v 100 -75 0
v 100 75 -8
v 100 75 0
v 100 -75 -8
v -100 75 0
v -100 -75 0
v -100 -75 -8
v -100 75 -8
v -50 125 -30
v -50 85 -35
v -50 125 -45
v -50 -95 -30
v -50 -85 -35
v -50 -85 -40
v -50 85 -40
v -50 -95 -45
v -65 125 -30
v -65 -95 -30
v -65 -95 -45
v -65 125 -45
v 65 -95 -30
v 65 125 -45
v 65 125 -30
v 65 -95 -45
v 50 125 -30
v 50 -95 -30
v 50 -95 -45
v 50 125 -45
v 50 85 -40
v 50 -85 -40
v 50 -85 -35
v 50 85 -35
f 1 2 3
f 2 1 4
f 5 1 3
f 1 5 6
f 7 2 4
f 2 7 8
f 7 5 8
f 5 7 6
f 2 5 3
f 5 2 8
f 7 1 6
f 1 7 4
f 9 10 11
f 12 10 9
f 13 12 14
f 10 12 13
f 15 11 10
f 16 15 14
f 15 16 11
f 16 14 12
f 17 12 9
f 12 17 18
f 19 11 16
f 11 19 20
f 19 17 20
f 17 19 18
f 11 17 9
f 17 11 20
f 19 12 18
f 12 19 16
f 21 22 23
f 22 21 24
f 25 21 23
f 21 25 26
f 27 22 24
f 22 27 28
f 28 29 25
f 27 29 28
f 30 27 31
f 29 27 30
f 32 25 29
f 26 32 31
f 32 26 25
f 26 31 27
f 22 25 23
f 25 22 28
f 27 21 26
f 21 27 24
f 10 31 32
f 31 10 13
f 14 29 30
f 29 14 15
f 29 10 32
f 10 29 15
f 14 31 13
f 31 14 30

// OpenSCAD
// file: Settings.scad
// Mesurements Of Platform Actual & Global Settings

// Mesurements ACTUAL

PlateWidth = 200;
PlateDepth = 150;
PlateHeight = 8;

ArmWidth = 15;
ArmHeight = 15;
ArmForwardProjection = 20;
ArmRearProjection = 50;
ArmVOffset = 30;

BaseWidth = 100;
BaseHeight = 5;
BaseForwardProjection = 10;
BaseRearProjection = 10;
BaseVOffset = 35;

BaseDeflectorLength = 20;
BaseDeflectorAngle = 45;

ScrewsWidthOutset = 5;
ScrewsDepthOutset = 5;

RearPlugWidth = 10;
RearPlugHeight = 5;
RearPlugVOffset = 1;

// Options
d = 0.01;


ClipSticksize = 5;
PlateThickness = 5;
UpperRollerProjection  = 40;
UpperRollerRadius = 10;

LowerRollerProjection = 20;
LowerRollerRadius = 5;


// Calculated


PlateArmOverhang = PlateWidth/2 - BaseWidth/2  - ArmWidth; 
// main file
// Roller Project Part #1 Front Bracket
include <Settings.scad>;

rig();

module rig(){
//plate
translate( v= [-PlateWidth/2,-PlateDepth/2,-PlateHeight]){
	color("red") cube(size=[PlateWidth,PlateDepth,PlateHeight]);
}

//arm
translate( v= [-BaseWidth/2-ArmWidth,-PlateDepth/2-ArmForwardProjection,-ArmVOffset-ArmHeight]){
	color("DarkSlateGray") cube(size=[ArmWidth,PlateDepth+ArmForwardProjection+ArmRearProjection,ArmHeight]);
}

//arm
translate( v= [BaseWidth/2,-PlateDepth/2-ArmForwardProjection,-ArmVOffset-ArmHeight]){
	color("DarkSlateGray")  cube(size=[ArmWidth,PlateDepth+ArmForwardProjection+ArmRearProjection,ArmHeight]);
}

//base
translate( v= [-BaseWidth/2,-PlateDepth/2-BaseForwardProjection,-BaseVOffset-BaseHeight]){
	color("DarkKhakicube") cube (size=[BaseWidth,PlateDepth+BaseForwardProjection+BaseRearProjection,BaseHeight]);
}
}
